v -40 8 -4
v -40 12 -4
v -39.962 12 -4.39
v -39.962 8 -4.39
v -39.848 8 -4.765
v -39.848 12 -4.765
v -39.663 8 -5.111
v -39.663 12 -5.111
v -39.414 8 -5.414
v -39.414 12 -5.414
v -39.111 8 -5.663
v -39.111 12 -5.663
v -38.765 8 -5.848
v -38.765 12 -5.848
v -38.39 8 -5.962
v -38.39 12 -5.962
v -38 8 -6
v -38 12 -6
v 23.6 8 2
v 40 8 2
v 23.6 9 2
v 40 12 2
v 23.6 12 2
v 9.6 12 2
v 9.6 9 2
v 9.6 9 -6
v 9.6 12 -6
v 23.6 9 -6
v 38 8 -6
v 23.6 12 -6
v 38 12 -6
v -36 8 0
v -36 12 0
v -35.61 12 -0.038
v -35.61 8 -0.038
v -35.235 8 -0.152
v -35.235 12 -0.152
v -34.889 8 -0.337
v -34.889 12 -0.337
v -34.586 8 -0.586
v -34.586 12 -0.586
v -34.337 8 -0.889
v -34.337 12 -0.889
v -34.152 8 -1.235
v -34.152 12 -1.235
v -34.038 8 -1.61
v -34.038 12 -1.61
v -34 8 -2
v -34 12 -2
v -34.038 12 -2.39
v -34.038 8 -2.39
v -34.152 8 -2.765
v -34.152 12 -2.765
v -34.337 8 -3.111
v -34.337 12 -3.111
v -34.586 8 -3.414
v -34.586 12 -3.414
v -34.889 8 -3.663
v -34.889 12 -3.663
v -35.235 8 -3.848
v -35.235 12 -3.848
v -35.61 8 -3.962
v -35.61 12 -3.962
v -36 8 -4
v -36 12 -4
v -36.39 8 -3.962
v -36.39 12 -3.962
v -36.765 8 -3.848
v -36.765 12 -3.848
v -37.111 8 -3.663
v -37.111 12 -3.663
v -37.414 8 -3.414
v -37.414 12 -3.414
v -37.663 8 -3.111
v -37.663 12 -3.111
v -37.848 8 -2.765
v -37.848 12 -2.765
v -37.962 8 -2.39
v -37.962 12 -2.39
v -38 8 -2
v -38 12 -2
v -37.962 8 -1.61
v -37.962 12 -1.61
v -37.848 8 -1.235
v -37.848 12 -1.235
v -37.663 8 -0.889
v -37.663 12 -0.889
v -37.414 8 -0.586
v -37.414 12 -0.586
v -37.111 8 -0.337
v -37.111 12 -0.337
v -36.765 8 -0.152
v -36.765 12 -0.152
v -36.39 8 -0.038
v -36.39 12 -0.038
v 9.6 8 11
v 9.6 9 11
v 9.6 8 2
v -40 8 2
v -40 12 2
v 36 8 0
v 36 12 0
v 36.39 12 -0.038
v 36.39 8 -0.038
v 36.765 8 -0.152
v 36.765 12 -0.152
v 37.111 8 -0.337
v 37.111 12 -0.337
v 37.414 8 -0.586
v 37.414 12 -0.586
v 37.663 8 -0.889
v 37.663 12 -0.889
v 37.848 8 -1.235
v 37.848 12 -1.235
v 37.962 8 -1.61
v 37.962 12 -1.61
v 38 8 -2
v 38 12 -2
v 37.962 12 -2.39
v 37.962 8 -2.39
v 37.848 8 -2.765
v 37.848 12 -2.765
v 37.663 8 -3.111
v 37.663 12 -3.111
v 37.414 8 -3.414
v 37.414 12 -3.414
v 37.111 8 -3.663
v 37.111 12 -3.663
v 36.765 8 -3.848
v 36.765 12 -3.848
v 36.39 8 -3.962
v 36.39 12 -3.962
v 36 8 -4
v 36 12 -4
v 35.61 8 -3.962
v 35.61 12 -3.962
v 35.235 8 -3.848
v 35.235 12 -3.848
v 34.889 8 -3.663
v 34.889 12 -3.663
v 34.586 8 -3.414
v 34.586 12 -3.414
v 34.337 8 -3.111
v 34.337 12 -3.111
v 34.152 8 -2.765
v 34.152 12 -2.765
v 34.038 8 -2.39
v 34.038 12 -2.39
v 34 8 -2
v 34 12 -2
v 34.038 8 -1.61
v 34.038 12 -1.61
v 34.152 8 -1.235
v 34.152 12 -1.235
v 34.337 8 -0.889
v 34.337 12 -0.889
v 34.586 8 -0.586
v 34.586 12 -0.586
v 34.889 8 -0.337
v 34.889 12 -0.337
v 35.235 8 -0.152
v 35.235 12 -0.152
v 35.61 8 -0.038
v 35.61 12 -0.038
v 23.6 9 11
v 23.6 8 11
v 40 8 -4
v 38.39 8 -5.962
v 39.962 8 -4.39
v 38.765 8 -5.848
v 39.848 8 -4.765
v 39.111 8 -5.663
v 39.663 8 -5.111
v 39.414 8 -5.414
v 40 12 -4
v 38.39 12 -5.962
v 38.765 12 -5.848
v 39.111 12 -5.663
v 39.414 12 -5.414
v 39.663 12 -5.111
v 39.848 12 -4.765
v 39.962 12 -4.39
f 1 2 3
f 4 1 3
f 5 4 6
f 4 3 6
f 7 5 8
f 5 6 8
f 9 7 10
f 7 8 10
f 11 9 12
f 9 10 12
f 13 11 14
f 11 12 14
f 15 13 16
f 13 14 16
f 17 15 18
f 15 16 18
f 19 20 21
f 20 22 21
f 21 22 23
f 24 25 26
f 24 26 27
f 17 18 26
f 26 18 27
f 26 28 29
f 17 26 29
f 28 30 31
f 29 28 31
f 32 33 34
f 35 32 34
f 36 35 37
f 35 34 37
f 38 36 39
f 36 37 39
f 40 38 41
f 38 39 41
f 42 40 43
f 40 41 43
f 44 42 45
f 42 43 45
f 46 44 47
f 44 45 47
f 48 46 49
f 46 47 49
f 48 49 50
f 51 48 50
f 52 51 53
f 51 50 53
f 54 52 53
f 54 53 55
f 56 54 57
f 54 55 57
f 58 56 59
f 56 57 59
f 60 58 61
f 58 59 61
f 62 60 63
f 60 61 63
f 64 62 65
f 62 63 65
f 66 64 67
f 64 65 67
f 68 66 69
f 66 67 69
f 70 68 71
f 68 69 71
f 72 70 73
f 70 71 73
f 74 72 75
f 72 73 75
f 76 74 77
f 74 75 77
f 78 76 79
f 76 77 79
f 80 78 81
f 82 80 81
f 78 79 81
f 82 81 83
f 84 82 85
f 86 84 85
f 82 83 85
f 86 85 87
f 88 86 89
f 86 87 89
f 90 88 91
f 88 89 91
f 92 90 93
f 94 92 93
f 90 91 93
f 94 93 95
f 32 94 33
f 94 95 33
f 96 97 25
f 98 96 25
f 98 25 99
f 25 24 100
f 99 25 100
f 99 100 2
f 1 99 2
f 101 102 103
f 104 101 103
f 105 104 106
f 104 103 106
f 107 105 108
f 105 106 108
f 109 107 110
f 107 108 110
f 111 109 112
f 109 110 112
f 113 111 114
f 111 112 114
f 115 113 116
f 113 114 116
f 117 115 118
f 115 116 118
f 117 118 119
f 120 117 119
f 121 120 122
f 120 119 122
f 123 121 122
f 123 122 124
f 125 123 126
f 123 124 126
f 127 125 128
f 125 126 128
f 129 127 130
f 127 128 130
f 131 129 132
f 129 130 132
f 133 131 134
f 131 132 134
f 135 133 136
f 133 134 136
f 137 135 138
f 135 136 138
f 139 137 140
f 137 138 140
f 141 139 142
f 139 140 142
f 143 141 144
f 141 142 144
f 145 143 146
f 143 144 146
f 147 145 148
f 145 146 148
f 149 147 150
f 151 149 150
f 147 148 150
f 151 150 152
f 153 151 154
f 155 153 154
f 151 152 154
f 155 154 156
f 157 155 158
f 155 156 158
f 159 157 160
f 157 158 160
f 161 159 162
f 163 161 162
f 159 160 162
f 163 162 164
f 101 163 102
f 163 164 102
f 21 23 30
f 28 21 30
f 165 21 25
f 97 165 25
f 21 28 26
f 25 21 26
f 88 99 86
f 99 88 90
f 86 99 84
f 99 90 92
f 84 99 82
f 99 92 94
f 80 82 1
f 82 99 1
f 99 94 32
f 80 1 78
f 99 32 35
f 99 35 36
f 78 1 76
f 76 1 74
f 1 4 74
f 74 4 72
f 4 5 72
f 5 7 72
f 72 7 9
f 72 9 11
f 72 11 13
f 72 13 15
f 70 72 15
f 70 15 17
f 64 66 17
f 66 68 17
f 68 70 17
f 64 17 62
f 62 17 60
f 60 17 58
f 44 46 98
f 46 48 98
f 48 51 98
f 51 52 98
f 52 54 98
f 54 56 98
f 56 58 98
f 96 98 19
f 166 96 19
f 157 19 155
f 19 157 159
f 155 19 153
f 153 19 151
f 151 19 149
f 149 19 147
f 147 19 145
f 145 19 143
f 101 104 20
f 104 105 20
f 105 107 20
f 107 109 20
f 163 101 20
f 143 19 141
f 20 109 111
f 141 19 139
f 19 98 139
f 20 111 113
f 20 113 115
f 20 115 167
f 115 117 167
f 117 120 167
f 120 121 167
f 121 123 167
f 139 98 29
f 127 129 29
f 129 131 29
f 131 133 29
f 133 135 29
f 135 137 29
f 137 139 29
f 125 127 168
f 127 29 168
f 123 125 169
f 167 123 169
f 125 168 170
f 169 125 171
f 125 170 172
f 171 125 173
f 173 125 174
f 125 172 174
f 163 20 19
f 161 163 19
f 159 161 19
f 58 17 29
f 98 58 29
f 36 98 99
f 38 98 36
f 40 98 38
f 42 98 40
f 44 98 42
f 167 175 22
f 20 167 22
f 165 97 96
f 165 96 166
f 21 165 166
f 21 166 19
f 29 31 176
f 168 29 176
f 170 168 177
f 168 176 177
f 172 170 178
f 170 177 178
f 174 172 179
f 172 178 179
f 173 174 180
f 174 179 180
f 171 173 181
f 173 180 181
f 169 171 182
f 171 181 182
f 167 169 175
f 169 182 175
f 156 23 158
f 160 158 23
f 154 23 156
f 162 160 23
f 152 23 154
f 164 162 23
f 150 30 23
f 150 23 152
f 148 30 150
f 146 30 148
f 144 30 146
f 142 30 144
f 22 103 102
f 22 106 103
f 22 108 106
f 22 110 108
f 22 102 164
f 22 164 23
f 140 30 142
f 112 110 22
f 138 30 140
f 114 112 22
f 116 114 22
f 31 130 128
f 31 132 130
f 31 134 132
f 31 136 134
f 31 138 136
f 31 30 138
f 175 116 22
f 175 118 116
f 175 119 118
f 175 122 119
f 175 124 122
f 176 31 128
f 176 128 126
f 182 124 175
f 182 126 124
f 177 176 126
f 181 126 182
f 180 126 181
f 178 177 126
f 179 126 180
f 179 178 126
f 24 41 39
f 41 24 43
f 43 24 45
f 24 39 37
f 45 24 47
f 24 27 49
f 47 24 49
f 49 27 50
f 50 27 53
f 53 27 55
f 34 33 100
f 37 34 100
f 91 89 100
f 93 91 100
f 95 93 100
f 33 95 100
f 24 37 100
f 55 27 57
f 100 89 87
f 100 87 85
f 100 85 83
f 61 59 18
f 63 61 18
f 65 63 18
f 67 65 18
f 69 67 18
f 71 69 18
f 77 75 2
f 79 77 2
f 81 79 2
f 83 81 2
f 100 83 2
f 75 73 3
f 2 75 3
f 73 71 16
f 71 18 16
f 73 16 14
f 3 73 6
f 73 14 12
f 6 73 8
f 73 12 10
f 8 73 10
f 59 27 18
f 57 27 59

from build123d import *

# Parameters (mm, degrees)
EXTRUDE_1_DEPTH     = 12
CUT_EXTRUDE_1_DEPTH = 12
SKETCH_3_R          = 2
CUT_EXTRUDE_2_DEPTH = 12
CUT_EXTRUDE_3_DEPTH = 1
SKETCH_5_W          = 80
SKETCH_5_H          = 4
CUT_EXTRUDE_4_DEPTH = 20
EXTRUDE_2_DEPTH     = 1
SKETCH_7_W          = 0.2
SKETCH_7_H          = 8
CUT_EXTRUDE_5_DEPTH = 1
SKETCH_8_R          = 2
EXTRUDE_3_DEPTH     = 4
SKETCH_9_W          = 80
SKETCH_9_H          = 8
CUT_EXTRUDE_6_DEPTH = 10
SKETCH_10_W         = 14
SKETCH_10_H         = 8
CUT_EXTRUDE_7_DEPTH = 2
SKETCH_11_W         = 14
SKETCH_11_H         = 9
EXTRUDE_4_DEPTH     = 2
SKETCH_12_W         = 14
SKETCH_12_H         = 1
CUT_EXTRUDE_8_DEPTH = 20


with BuildPart() as part:
    # 草图1 → 凸台-拉伸1 (new body)
    with BuildSketch(Plane(origin=(0, 0, 0), x_dir=(1, 0, 0), z_dir=(0, 1, 0))):
        Polygon((-40, -6), (0, -6), (40, -6), (40, 0), (40, 6), (0, 6), (-36, 6), (-40, 6), align=None)
    extrude(amount=EXTRUDE_1_DEPTH)

    # 草图2 → 切除-拉伸1 (cut)
    with BuildSketch(Plane.XY.offset(6)):
        Polygon((-28, 0), (0, 0), (28, 0), (28, 4), (28, 8), (-28, 8), (-28, 4), align=None)
        Polygon((-40, 4), (-32, 4), (-32, 8), (-32, 12), (-40, 12), align=None)
        Polygon((32, 8), (32, 4), (40, 4), (40, 12), (32, 12), align=None)
    extrude(amount=-CUT_EXTRUDE_1_DEPTH, mode=Mode.SUBTRACT)

    # 草图3 → 切除-拉伸2 (cut)
    with BuildSketch(Plane(origin=(0, 12, 0), x_dir=(1, 0, 0), z_dir=(0, 1, 0))):
        with BuildLine():
            Line((-40, 6), (-40, 4))
            ThreePointArc((-40, 4), (-39.414213562, 5.414213562), (-38, 6))
            Line((-38, 6), (-40, 6))
        make_face()
        with Locations(Location((-36, 2, 0), (0, 0, 270))):
            Circle(SKETCH_3_R)
        with BuildLine():
            ThreePointArc((40, 4), (39.414213562, 5.414213562), (38, 6))
            Line((38, 6), (40, 6))
            Line((40, 6), (40, 4))
        make_face()
        with Locations(Location((36, 2, 0), (0, 0, 270))):
            Circle(SKETCH_3_R)
    extrude(amount=-CUT_EXTRUDE_2_DEPTH, mode=Mode.SUBTRACT)

    # 草图4 → 切除-拉伸3 (cut)
    with BuildSketch(Plane(origin=(0, 12, 0), x_dir=(1, 0, 0), z_dir=(0, 1, 0))):
        Polygon((-21.1, 0), (-21.1, 6), (-16.6, 6), (-12.1, 6), (12.08, 6), (16.6, 6), (21.12, 6), (21.12, -1), (21.12, -6), (16.6, -6), (12.08, -6), (12.08, -1), (12.08, 0), (-12.1, 0), (-12.1, -6), (-16.6, -6), (-21.1, -6), align=None)
    extrude(amount=-CUT_EXTRUDE_3_DEPTH, mode=Mode.SUBTRACT)

    # 草图5 → 切除-拉伸4 (cut)
    with BuildSketch(Plane(origin=(0, 12, 0), x_dir=(1, 0, 0), z_dir=(0, 1, 0))):
        with Locations((0, -4)):
            Rectangle(SKETCH_5_W, SKETCH_5_H)
    extrude(amount=-CUT_EXTRUDE_4_DEPTH, mode=Mode.SUBTRACT)

    # 草图6 → 凸台-拉伸2 (add)
    with BuildSketch(Plane(origin=(0, 12, 0), x_dir=(1, 0, 0), z_dir=(0, 1, 0))):
        Polygon((12.08, 0), (12.08, 6), (-21.1, 6), (-21.1, -2), (-12.1, -2), (-12.1, 0), align=None)
    extrude(amount=-EXTRUDE_2_DEPTH)

    # 草图7 → 切除-拉伸5 (cut)
    with BuildSketch(Plane(origin=(0, 12, 0), x_dir=(1, 0, 0), z_dir=(0, 1, 0))):
        with Locations((21.22, 2)):
            Rectangle(SKETCH_7_W, SKETCH_7_H)
        with Locations((11.98, 2)):
            Rectangle(SKETCH_7_W, SKETCH_7_H)
    extrude(amount=-CUT_EXTRUDE_5_DEPTH, mode=Mode.SUBTRACT)

    # 草图8 → 凸台-拉伸3 (add)
    # profile 1 of 2: a face of its own
    with BuildSketch(Plane(origin=(0, 12, 0), x_dir=(1, 0, 0), z_dir=(0, 1, 0))):
        with BuildLine():
            Line((-32, -2), (-40, -2))
            Line((-40, -2), (-40, 4))
            ThreePointArc((-40, 4), (-39.414213562, 5.414213562), (-38, 6))
            Line((-38, 6), (-32, 6))
            Line((-32, 6), (-32, -2))
        make_face()
        with Locations(Location((-36, 2, 0), (0, 0, 270))):
            Circle(SKETCH_8_R, mode=Mode.SUBTRACT)
    # profile 2 of 2: a face of its own
    with BuildSketch(Plane(origin=(0, 12, 0), x_dir=(1, 0, 0), z_dir=(0, 1, 0))):
        with BuildLine():
            Line((32, -2), (32, 6))
            Line((32, 6), (38, 6))
            ThreePointArc((38, 6), (39.414213562, 5.414213562), (40, 4))
            Line((40, 4), (40, -2))
            Line((40, -2), (32, -2))
        make_face()
        with Locations(Location((36, 2, 0), (0, 0, 270))):
            Circle(SKETCH_8_R, mode=Mode.SUBTRACT)
    extrude(amount=-EXTRUDE_3_DEPTH)

    # 草图9 → 切除-拉伸6 (cut)
    with BuildSketch(Plane.XY.offset(2)):
        with Locations((0, 4)):
            Rectangle(SKETCH_9_W, SKETCH_9_H)
    extrude(amount=-CUT_EXTRUDE_6_DEPTH, mode=Mode.SUBTRACT)

    # 草图10 → 切除-拉伸7 (cut)
    with BuildSketch(Plane(origin=(0, 12, 0), x_dir=(1, 0, 0), z_dir=(0, 1, 0))):
        with Locations((16.6, 2)):
            Rectangle(SKETCH_10_W, SKETCH_10_H)
    extrude(amount=-CUT_EXTRUDE_7_DEPTH, mode=Mode.SUBTRACT)

    # 草图11 → 凸台-拉伸4 (add)
    with BuildSketch(Plane(origin=(0, 10, 0), x_dir=(1, 0, 0), z_dir=(0, 1, 0))):
        with Locations((16.6, -6.5)):
            Rectangle(SKETCH_11_W, SKETCH_11_H)
    extrude(amount=-EXTRUDE_4_DEPTH)

    # 草图12 → 切除-拉伸8 (cut)
    with BuildSketch(Plane(origin=(0, 0, -6), x_dir=(-1, 0, 0), z_dir=(0, 0, -1))):
        with Locations((-16.6, 9.5)):
            Rectangle(SKETCH_12_W, SKETCH_12_H)
    extrude(amount=-CUT_EXTRUDE_8_DEPTH, mode=Mode.SUBTRACT)


solid = part.part
